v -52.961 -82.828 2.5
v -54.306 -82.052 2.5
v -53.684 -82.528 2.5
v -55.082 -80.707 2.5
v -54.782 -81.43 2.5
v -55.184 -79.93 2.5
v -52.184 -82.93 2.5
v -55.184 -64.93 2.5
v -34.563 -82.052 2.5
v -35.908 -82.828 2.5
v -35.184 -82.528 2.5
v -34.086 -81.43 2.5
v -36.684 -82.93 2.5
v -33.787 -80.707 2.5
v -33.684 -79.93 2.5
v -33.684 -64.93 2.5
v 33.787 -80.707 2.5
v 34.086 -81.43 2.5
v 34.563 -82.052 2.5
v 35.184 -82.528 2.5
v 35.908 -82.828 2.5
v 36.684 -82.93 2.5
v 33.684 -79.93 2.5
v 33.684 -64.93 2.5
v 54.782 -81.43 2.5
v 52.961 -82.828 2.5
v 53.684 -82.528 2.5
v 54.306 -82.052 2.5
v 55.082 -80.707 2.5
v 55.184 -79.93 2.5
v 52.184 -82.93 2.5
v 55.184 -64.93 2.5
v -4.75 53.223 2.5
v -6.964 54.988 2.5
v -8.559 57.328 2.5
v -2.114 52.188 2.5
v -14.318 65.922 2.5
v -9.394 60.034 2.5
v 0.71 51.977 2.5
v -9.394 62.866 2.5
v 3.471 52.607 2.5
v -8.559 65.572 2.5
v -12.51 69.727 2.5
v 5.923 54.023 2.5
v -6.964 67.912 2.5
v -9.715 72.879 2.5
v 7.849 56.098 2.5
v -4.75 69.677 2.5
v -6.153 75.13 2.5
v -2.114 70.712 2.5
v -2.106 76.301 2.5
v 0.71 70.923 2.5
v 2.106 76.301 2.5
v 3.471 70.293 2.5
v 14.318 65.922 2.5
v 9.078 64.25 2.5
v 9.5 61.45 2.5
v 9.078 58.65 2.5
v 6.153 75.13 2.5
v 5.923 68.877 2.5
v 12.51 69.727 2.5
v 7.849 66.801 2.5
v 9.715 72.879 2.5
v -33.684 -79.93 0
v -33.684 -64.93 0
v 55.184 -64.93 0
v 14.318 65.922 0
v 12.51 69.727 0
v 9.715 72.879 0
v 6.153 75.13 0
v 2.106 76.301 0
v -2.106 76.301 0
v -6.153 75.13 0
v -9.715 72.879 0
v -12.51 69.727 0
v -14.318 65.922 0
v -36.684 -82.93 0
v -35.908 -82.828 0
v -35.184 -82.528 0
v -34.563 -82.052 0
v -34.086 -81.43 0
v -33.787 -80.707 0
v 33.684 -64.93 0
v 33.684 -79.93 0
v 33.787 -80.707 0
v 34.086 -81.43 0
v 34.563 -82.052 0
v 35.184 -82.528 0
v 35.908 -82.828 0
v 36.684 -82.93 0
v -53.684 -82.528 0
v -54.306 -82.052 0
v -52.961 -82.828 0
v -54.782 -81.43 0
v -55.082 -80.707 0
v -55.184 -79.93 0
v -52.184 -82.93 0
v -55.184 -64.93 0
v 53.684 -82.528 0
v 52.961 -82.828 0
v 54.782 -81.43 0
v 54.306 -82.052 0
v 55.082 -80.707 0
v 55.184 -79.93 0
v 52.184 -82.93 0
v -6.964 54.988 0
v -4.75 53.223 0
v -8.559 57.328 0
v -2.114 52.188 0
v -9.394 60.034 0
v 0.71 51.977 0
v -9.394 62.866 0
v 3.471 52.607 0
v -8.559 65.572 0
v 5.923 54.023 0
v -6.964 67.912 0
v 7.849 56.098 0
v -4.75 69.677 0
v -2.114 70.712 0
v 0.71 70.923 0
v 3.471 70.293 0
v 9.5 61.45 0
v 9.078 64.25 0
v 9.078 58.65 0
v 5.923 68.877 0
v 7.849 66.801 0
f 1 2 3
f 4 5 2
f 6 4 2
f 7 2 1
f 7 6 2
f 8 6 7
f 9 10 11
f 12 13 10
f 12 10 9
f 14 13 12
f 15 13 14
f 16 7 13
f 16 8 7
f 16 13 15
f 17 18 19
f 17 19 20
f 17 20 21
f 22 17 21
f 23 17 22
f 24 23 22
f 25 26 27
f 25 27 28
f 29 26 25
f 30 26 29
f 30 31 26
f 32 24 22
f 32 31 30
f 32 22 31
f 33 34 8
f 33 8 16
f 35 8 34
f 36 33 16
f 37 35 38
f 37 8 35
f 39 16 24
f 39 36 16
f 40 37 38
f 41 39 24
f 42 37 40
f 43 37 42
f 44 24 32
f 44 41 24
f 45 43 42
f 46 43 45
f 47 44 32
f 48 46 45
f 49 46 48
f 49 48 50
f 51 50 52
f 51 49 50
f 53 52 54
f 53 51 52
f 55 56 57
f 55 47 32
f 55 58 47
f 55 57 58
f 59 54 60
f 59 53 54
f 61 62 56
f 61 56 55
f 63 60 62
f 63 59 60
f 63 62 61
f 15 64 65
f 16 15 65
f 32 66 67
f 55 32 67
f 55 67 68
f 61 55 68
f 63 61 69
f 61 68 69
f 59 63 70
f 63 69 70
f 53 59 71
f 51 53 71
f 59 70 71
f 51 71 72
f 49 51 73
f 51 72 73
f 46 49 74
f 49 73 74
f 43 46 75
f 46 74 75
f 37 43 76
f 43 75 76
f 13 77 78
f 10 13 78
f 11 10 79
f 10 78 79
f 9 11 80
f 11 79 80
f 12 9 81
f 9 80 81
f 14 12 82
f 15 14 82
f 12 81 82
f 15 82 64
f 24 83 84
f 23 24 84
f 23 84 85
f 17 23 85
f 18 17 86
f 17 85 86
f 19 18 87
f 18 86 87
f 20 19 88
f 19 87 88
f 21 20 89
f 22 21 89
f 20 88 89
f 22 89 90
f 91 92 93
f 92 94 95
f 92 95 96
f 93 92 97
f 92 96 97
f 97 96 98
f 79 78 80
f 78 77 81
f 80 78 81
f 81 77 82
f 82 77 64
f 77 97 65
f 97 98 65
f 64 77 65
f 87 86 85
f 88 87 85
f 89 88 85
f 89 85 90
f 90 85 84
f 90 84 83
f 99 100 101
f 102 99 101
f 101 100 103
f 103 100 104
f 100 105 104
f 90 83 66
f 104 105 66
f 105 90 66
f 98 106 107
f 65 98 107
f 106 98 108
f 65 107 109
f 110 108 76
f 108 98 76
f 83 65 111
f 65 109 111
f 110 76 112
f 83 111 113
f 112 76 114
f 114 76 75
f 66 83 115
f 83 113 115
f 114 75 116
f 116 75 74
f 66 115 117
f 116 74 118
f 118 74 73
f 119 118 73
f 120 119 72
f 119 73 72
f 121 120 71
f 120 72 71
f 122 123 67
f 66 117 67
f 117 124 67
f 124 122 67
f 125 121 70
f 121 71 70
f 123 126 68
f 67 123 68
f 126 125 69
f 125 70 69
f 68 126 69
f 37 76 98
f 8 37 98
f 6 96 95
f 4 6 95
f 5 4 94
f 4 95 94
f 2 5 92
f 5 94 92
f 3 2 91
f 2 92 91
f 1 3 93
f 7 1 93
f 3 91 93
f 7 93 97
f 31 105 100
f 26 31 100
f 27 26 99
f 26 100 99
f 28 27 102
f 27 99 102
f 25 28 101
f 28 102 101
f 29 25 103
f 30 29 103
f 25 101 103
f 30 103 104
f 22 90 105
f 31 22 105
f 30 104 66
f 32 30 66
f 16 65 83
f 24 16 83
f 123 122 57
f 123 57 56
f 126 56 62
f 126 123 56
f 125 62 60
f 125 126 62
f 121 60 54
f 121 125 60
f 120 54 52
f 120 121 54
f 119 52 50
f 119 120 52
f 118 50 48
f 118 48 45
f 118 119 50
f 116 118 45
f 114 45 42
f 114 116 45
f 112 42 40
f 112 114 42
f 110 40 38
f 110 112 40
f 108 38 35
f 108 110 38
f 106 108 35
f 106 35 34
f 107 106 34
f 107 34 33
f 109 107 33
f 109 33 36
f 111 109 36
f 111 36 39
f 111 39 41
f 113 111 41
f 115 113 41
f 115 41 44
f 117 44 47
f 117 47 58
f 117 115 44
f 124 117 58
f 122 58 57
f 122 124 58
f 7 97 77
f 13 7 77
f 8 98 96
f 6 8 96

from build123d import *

# Parameters (mm, degrees)
F0_R     = 9.5
F1_DEPTH = 2.5


with BuildPart() as f1:
    # F0 (on Top) → F1 (new body)
    with BuildSketch(Plane.XY):
        with BuildLine():
            ThreePointArc((-14.317976, 65.921586), (-2.261677, 46.621432), (15, 61.449946))
            ThreePointArc((15, 61.449946), (14.828514, 63.711623), (14.317976, 65.921586))
            ThreePointArc((14.317976, 65.921586), (0, 76.449946), (-14.317976, 65.921586))
        make_face()
        with Locations((0, 61.449946)):
            Circle(F0_R, mode=Mode.SUBTRACT)
        with BuildLine():
            ThreePointArc((14.317976, 65.921586), (14.828514, 63.711623), (15, 61.449946))
            ThreePointArc((15, 61.449946), (-2.261677, 46.621432), (-14.317976, 65.921586))
            Line((-14.317976, 65.921586), (-55.184302, -64.930417))
            Line((-55.184302, -64.930417), (-55.184302, -79.930417))
            ThreePointArc((-55.184302, -79.930417), (-54.305622, -82.051737), (-52.184302, -82.930417))
            Line((-52.184302, -82.930417), (-36.684302, -82.930417))
            ThreePointArc((-36.684302, -82.930417), (-34.562982, -82.051737), (-33.684302, -79.930417))
            Line((-33.684302, -79.930417), (-33.684302, -64.930417))
            Line((-33.684302, -64.930417), (33.684302, -64.930417))
            Line((33.684302, -64.930417), (33.684302, -79.930417))
            ThreePointArc((33.684302, -79.930417), (34.562982, -82.051737), (36.684302, -82.930417))
            Line((36.684302, -82.930417), (52.184302, -82.930417))
            ThreePointArc((52.184302, -82.930417), (54.305622, -82.051737), (55.184302, -79.930417))
            Line((55.184302, -79.930417), (55.184302, -64.930417))
            Line((55.184302, -64.930417), (14.317976, 65.921586))
        make_face()
    extrude(amount=F1_DEPTH)


solid = f1.part
